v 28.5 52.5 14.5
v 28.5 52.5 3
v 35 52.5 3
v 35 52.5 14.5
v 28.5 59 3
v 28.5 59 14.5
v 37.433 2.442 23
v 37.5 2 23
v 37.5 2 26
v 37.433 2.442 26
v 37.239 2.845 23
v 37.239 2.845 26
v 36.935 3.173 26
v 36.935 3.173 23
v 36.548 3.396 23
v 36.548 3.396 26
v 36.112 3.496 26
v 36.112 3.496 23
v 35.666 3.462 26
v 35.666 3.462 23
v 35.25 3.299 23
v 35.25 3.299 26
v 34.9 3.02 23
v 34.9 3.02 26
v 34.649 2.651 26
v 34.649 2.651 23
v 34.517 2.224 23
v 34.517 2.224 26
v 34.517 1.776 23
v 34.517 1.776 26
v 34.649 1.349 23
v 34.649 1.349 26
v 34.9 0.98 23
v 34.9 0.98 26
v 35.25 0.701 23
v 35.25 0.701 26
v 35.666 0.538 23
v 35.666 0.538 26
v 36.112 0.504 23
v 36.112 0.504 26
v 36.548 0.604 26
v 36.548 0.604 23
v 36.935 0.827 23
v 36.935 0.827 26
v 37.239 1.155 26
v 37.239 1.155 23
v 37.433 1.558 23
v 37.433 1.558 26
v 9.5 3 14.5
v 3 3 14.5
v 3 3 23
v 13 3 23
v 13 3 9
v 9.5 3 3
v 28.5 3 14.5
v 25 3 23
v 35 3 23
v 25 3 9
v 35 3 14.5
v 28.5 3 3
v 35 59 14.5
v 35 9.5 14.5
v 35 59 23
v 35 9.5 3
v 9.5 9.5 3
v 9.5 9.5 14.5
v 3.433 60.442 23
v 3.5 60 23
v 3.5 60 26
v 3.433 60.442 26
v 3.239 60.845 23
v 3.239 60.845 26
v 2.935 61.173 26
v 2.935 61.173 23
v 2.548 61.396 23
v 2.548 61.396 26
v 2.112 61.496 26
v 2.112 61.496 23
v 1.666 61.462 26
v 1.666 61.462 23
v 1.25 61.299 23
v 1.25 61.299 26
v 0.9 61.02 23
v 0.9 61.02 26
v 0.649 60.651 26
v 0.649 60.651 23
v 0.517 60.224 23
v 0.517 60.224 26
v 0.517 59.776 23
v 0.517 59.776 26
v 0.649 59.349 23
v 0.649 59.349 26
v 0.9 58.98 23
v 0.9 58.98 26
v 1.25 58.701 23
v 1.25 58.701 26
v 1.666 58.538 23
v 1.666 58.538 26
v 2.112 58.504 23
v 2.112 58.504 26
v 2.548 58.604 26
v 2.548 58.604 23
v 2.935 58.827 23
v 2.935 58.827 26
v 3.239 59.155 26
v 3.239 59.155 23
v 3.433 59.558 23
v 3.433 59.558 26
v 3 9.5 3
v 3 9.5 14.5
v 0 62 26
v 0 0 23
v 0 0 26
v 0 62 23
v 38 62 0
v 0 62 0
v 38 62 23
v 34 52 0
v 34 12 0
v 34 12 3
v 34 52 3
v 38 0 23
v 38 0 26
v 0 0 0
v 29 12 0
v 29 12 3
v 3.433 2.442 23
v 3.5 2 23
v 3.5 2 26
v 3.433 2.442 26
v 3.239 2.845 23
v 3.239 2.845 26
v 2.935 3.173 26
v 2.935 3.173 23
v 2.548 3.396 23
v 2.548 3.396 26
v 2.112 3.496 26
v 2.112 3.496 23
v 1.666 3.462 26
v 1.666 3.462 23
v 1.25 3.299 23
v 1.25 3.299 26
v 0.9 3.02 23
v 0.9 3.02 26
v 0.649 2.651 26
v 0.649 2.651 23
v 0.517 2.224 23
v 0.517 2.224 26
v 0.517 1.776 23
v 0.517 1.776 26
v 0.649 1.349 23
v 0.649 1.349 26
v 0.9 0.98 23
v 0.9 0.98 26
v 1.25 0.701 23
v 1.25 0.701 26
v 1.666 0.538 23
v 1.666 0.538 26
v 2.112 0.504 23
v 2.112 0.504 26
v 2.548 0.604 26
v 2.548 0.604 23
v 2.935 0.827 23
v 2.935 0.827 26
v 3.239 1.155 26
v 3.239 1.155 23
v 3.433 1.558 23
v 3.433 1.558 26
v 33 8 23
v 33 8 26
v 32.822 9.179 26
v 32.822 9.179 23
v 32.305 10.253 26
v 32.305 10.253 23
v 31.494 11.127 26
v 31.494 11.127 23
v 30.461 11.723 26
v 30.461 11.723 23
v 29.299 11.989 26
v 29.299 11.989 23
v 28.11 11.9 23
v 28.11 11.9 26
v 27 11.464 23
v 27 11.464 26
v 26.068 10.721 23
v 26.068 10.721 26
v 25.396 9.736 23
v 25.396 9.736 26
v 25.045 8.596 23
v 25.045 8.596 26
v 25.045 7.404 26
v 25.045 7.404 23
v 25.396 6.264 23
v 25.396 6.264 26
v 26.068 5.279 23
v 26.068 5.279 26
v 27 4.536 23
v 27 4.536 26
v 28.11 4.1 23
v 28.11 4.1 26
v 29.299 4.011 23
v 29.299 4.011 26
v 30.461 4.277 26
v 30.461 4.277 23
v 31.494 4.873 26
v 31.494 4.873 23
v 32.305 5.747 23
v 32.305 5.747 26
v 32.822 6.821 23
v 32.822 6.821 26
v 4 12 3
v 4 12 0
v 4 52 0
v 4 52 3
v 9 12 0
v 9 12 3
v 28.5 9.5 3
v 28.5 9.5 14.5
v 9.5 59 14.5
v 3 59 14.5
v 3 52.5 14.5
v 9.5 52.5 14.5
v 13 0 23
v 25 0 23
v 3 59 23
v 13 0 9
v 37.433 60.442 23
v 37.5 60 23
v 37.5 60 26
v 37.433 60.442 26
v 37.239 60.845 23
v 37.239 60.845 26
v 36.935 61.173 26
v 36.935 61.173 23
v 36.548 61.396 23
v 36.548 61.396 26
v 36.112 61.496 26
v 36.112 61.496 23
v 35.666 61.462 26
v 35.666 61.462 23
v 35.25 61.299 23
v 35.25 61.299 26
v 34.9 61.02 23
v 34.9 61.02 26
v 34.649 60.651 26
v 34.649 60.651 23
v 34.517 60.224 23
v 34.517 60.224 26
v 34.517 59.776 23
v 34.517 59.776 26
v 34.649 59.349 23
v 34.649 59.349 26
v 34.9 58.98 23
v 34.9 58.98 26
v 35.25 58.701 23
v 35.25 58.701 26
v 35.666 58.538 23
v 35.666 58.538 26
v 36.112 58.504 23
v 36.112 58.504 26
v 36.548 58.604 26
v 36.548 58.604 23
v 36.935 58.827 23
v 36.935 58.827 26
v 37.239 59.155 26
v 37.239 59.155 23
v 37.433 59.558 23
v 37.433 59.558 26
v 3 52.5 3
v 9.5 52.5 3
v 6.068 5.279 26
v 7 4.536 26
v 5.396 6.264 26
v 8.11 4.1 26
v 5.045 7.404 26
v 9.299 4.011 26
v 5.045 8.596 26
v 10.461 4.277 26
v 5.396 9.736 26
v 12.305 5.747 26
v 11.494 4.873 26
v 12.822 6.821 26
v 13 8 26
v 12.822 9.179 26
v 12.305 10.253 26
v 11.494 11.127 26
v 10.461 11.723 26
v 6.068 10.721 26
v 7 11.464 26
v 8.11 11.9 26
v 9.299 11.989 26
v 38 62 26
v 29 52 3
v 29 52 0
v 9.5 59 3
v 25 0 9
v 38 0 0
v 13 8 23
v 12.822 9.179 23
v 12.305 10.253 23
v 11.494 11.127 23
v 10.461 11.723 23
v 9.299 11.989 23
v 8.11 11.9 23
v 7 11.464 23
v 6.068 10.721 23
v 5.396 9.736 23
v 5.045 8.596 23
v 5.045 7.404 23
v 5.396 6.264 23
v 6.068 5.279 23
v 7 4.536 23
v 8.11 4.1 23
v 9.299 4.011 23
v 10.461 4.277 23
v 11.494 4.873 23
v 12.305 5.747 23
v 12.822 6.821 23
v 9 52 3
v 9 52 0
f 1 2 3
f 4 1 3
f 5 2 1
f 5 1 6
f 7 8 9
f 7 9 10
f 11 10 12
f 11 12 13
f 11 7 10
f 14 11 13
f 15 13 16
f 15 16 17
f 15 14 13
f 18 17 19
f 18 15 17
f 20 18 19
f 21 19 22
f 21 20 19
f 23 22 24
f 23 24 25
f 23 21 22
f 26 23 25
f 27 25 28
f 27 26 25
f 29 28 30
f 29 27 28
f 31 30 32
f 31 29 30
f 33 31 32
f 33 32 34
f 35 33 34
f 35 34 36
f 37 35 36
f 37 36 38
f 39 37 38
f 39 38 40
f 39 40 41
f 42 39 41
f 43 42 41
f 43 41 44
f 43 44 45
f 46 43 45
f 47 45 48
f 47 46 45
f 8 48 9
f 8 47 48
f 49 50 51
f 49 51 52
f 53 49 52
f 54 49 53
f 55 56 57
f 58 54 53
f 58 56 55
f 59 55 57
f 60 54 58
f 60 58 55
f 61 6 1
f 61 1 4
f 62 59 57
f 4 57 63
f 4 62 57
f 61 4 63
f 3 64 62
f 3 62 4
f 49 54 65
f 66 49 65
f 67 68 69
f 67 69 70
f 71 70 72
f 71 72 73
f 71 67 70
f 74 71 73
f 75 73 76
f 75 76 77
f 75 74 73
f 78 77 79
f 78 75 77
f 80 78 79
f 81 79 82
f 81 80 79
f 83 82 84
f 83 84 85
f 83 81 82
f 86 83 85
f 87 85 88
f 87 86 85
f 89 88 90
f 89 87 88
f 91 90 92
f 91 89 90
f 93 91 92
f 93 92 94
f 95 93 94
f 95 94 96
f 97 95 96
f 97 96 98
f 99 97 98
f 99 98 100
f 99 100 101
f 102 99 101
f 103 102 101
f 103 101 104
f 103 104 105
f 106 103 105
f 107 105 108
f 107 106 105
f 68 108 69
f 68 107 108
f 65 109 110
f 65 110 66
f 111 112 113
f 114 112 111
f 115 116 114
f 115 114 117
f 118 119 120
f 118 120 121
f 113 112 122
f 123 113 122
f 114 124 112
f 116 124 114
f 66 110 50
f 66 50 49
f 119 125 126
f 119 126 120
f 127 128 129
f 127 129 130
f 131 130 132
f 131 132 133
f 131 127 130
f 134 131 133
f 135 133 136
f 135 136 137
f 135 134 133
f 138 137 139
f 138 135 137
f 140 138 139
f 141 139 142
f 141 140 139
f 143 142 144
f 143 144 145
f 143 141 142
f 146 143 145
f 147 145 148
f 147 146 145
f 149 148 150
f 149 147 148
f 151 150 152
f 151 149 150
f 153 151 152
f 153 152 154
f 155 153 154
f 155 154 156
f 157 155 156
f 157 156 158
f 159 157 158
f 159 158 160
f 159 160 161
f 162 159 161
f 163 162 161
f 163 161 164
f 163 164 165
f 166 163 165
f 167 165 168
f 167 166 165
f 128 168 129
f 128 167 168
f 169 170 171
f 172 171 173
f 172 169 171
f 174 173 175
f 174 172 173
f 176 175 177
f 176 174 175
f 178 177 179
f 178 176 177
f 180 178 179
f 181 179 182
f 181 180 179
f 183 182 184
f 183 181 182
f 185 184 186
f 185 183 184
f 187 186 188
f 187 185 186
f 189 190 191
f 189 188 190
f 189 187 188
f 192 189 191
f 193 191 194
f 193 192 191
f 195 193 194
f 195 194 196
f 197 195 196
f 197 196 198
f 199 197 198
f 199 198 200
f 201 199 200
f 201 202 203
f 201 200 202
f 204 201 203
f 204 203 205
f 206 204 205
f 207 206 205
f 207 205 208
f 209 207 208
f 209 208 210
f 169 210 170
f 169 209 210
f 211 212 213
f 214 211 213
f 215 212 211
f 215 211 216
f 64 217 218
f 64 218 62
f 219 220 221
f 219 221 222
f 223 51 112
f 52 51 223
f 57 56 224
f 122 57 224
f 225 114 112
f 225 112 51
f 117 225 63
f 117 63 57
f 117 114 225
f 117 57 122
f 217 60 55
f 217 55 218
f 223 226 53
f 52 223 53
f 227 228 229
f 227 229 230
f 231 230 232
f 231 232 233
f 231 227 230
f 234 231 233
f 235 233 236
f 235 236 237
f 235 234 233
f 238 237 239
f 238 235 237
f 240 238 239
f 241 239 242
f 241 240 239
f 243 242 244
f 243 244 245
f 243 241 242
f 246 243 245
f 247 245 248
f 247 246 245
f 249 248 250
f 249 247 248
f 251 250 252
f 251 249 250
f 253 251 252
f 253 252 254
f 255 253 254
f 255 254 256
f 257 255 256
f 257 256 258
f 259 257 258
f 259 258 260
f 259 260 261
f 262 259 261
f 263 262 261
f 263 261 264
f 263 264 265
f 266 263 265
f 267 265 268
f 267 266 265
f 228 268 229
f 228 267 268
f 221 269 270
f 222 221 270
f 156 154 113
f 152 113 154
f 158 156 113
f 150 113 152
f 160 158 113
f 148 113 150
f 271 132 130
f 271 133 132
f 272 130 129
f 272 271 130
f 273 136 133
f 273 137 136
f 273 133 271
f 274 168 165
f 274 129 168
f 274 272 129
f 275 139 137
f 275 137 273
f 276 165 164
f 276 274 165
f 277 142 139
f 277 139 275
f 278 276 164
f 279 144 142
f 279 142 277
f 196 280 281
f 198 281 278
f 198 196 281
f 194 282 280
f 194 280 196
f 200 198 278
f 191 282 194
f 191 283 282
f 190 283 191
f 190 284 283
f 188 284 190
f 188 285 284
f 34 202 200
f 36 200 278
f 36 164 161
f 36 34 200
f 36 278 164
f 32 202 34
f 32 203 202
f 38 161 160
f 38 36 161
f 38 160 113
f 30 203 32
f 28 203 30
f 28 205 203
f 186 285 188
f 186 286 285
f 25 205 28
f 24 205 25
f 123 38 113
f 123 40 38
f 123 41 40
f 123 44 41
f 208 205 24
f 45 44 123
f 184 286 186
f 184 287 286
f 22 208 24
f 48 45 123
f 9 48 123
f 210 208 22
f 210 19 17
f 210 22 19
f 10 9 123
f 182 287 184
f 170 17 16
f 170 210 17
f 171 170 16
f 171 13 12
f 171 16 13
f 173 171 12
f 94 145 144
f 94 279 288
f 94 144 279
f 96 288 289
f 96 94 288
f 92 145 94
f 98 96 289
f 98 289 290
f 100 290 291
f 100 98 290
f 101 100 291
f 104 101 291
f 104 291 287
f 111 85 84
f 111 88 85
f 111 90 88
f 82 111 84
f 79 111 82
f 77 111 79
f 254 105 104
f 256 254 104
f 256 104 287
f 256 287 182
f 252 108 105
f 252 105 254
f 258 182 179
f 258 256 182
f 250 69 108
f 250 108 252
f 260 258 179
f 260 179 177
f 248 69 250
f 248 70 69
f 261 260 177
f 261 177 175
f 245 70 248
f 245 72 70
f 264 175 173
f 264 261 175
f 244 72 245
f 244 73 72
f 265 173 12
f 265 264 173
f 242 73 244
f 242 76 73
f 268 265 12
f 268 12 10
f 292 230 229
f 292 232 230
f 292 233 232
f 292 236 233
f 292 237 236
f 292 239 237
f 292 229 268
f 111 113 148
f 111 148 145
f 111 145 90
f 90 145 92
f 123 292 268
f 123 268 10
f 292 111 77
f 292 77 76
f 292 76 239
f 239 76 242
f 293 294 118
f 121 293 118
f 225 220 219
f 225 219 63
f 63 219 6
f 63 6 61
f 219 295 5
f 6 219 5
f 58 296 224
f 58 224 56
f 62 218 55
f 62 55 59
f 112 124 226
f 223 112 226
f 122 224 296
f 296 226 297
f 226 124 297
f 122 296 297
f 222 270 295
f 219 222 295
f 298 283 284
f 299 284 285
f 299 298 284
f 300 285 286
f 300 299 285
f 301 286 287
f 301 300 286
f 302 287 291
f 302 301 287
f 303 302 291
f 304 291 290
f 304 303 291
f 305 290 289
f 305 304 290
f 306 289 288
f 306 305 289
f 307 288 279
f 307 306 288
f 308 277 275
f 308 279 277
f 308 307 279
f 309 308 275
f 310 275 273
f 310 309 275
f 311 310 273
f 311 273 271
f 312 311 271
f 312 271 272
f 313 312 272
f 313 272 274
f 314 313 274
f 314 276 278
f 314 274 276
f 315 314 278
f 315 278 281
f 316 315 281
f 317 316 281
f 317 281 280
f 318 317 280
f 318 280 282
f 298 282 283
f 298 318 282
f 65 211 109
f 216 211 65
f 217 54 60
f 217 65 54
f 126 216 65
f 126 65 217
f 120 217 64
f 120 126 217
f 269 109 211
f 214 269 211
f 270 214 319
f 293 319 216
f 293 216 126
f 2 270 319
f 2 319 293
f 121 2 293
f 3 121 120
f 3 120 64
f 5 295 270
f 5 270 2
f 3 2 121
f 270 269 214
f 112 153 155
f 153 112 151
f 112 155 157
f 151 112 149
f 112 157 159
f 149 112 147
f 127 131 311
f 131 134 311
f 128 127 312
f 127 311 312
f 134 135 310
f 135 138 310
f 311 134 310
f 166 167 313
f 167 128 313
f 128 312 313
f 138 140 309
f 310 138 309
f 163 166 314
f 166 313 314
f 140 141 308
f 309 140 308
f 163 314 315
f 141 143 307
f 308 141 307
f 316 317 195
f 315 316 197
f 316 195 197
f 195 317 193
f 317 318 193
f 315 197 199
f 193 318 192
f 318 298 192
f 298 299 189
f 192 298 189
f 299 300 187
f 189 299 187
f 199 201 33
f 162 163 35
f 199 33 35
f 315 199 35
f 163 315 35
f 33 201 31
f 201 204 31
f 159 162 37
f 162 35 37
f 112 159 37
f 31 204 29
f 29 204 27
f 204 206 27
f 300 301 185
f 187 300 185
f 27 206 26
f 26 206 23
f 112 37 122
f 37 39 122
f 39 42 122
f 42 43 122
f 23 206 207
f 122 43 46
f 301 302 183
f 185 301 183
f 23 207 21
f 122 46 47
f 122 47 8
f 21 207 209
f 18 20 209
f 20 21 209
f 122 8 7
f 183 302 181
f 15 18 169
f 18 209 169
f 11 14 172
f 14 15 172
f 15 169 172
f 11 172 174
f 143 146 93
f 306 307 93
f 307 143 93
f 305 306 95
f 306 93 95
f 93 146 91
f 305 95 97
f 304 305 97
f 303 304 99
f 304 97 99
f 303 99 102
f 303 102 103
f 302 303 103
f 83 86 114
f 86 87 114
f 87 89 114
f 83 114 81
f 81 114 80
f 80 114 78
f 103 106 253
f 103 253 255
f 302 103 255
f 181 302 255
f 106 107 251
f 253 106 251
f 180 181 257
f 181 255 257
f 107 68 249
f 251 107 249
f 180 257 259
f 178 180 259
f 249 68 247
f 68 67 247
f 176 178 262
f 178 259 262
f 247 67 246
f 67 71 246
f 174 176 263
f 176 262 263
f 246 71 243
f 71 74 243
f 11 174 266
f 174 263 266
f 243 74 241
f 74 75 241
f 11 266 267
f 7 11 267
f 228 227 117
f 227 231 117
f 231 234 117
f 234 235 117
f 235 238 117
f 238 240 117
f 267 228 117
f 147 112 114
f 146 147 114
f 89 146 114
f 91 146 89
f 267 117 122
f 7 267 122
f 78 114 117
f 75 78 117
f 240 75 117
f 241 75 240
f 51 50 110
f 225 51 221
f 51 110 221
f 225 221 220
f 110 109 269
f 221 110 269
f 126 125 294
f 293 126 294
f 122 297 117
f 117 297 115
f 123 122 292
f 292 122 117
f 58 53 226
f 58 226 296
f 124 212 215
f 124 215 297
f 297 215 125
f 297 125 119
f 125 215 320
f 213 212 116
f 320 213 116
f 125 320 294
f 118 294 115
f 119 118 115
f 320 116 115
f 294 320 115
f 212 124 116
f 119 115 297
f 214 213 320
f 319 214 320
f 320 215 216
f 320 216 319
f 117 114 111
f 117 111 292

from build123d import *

# Parameters (mm, degrees)
BOX010_W          = 12
BOX010_H          = 3
BOX010_DEPTH      = 14
BOX009_W          = 5
BOX009_H          = 40
BOX009_DEPTH      = 3
BOX008_W          = 5
BOX008_H          = 40
BOX008_DEPTH      = 3
BOX005_W          = 6.5
BOX005_H          = 6.5
BOX005_DEPTH      = 14.5
BOX006_W          = 6.5
BOX006_H          = 6.5
BOX006_DEPTH      = 14.5
BOX007_W          = 6.5
BOX007_H          = 6.5
BOX007_DEPTH      = 14.5
BOX004_W          = 6.5
BOX004_H          = 6.5
BOX004_DEPTH      = 14.5
BOX001_W          = 32
BOX001_H          = 56
BOX001_DEPTH      = 23
BOX_W             = 38
BOX_H             = 62
BOX_DEPTH         = 23
BOX002_W          = 38
BOX002_H          = 62
BOX002_DEPTH      = 3
CYLINDER003_R     = 1.5
CYLINDER003_DEPTH = 3
CYLINDER004_R     = 1.5
CYLINDER004_DEPTH = 3
CYLINDER005_R     = 1.5
CYLINDER005_DEPTH = 3
CYLINDER002_R     = 1.5
CYLINDER002_DEPTH = 3
CYLINDER001_R     = 4
CYLINDER001_DEPTH = 10
CYLINDER_R        = 4
CYLINDER_DEPTH    = 10
BOX003_W          = 38
BOX003_H          = 62
BOX003_DEPTH      = 3


with BuildPart() as box010:
    # Box010 → Box010 (new body)
    with BuildSketch(Plane(origin=(13, 0, 9), x_dir=(1, 0, 0), z_dir=(0, 0, 1))):
        with Locations((6, 1.5)):
            Rectangle(BOX010_W, BOX010_H)
    extrude(amount=BOX010_DEPTH)


with BuildPart() as box009:
    # Box009 → Box009 (new body)
    with BuildSketch(Plane(origin=(29, 12, 0), x_dir=(1, 0, 0), z_dir=(0, 0, 1))):
        with Locations((2.5, 20)):
            Rectangle(BOX009_W, BOX009_H)
    extrude(amount=BOX009_DEPTH)


with BuildPart() as rendijas:
    # Box008 → Box008 (new body)
    with BuildSketch(Plane(origin=(4, 12, 0), x_dir=(1, 0, 0), z_dir=(0, 0, 1))):
        with Locations((2.5, 20)):
            Rectangle(BOX008_W, BOX008_H)
    extrude(amount=BOX008_DEPTH)

    # Fusion003: union Box009
    add(box009.part)


with BuildPart() as box005:
    # Box005 → Box005 (new body)
    with BuildSketch(Plane(origin=(28.5, 3, 0), x_dir=(1, 0, 0), z_dir=(0, 0, 1))):
        with Locations((3.25, 3.25)):
            Rectangle(BOX005_W, BOX005_H)
    extrude(amount=BOX005_DEPTH)


with BuildPart() as box006:
    # Box006 → Box006 (new body)
    with BuildSketch(Plane(origin=(3, 52.5, 0), x_dir=(1, 0, 0), z_dir=(0, 0, 1))):
        with Locations((3.25, 3.25)):
            Rectangle(BOX006_W, BOX006_H)
    extrude(amount=BOX006_DEPTH)


with BuildPart() as box007:
    # Box007 → Box007 (new body)
    with BuildSketch(Plane(origin=(28.5, 52.5, 0), x_dir=(1, 0, 0), z_dir=(0, 0, 1))):
        with Locations((3.25, 3.25)):
            Rectangle(BOX007_W, BOX007_H)
    extrude(amount=BOX007_DEPTH)


with BuildPart() as soportes:
    # Box004 → Box004 (new body)
    with BuildSketch(Plane(origin=(3, 3, 0), x_dir=(1, 0, 0), z_dir=(0, 0, 1))):
        with Locations((3.25, 3.25)):
            Rectangle(BOX004_W, BOX004_H)
    extrude(amount=BOX004_DEPTH)

    # Fusion001: union Box005, Box006, Box007
    add(box005.part)
    add(box006.part)
    add(box007.part)


with BuildPart() as box001:
    # Box001 → Box001 (new body)
    with BuildSketch(Plane(origin=(3, 3, 0), x_dir=(1, 0, 0), z_dir=(0, 0, 1))):
        with Locations((16, 28)):
            Rectangle(BOX001_W, BOX001_H)
    extrude(amount=BOX001_DEPTH)


with BuildPart() as carcasa_laterales:
    # Box → Box (new body)
    with BuildSketch(Plane.XY):
        with Locations((19, 31)):
            Rectangle(BOX_W, BOX_H)
    extrude(amount=BOX_DEPTH)

    # Cut: cut Box001
    add(box001.part, mode=Mode.SUBTRACT)


with BuildPart() as carcasa:
    # Box002 → Box002 (new body)
    with BuildSketch(Plane.XY):
        with Locations((19, 31)):
            Rectangle(BOX002_W, BOX002_H)
    extrude(amount=BOX002_DEPTH)

    # Fusion: union carcasa laterales
    add(carcasa_laterales.part)

    # Fusion002: union soportes
    add(soportes.part)

    # Cut001: cut rendijas
    add(rendijas.part, mode=Mode.SUBTRACT)

    # Cut002: cut Box010
    add(box010.part, mode=Mode.SUBTRACT)


with BuildPart() as tornillo2:
    # Cylinder003 → Cylinder003 (new body)
    with BuildSketch(Plane(origin=(36, 2, 23), x_dir=(1, 0, 0), z_dir=(0, 0, 1))):
        Circle(CYLINDER003_R)
    extrude(amount=CYLINDER003_DEPTH)


with BuildPart() as tornillo3:
    # Cylinder004 → Cylinder004 (new body)
    with BuildSketch(Plane(origin=(2, 60, 23), x_dir=(1, 0, 0), z_dir=(0, 0, 1))):
        Circle(CYLINDER004_R)
    extrude(amount=CYLINDER004_DEPTH)


with BuildPart() as tornillo4:
    # Cylinder005 → Cylinder005 (new body)
    with BuildSketch(Plane(origin=(36, 60, 23), x_dir=(1, 0, 0), z_dir=(0, 0, 1))):
        Circle(CYLINDER005_R)
    extrude(amount=CYLINDER005_DEPTH)


with BuildPart() as tornillos:
    # Cylinder002 → Cylinder002 (new body)
    with BuildSketch(Plane(origin=(2, 2, 23), x_dir=(1, 0, 0), z_dir=(0, 0, 1))):
        Circle(CYLINDER002_R)
    extrude(amount=CYLINDER002_DEPTH)

    # Fusion005: union tornillo2, tornillo3, tornillo4
    add(tornillo2.part)
    add(tornillo3.part)
    add(tornillo4.part)


with BuildPart() as switch2:
    # Cylinder001 → Cylinder001 (new body)
    with BuildSketch(Plane(origin=(29, 8, 23), x_dir=(1, 0, 0), z_dir=(0, 0, 1))):
        Circle(CYLINDER001_R)
    extrude(amount=CYLINDER001_DEPTH)


with BuildPart() as switches:
    # Cylinder → Cylinder (new body)
    with BuildSketch(Plane(origin=(9, 8, 23), x_dir=(1, 0, 0), z_dir=(0, 0, 1))):
        Circle(CYLINDER_R)
    extrude(amount=CYLINDER_DEPTH)

    # Fusion004: union switch2
    add(switch2.part)


with BuildPart() as tapa:
    # Box003 → Box003 (new body)
    with BuildSketch(Plane.XY.offset(23)):
        with Locations((19, 31)):
            Rectangle(BOX003_W, BOX003_H)
    extrude(amount=BOX003_DEPTH)

    # Cut003: cut switches
    add(switches.part, mode=Mode.SUBTRACT)

    # Cut004: cut tornillos
    add(tornillos.part, mode=Mode.SUBTRACT)


solid = Compound([carcasa.part, tapa.part])
